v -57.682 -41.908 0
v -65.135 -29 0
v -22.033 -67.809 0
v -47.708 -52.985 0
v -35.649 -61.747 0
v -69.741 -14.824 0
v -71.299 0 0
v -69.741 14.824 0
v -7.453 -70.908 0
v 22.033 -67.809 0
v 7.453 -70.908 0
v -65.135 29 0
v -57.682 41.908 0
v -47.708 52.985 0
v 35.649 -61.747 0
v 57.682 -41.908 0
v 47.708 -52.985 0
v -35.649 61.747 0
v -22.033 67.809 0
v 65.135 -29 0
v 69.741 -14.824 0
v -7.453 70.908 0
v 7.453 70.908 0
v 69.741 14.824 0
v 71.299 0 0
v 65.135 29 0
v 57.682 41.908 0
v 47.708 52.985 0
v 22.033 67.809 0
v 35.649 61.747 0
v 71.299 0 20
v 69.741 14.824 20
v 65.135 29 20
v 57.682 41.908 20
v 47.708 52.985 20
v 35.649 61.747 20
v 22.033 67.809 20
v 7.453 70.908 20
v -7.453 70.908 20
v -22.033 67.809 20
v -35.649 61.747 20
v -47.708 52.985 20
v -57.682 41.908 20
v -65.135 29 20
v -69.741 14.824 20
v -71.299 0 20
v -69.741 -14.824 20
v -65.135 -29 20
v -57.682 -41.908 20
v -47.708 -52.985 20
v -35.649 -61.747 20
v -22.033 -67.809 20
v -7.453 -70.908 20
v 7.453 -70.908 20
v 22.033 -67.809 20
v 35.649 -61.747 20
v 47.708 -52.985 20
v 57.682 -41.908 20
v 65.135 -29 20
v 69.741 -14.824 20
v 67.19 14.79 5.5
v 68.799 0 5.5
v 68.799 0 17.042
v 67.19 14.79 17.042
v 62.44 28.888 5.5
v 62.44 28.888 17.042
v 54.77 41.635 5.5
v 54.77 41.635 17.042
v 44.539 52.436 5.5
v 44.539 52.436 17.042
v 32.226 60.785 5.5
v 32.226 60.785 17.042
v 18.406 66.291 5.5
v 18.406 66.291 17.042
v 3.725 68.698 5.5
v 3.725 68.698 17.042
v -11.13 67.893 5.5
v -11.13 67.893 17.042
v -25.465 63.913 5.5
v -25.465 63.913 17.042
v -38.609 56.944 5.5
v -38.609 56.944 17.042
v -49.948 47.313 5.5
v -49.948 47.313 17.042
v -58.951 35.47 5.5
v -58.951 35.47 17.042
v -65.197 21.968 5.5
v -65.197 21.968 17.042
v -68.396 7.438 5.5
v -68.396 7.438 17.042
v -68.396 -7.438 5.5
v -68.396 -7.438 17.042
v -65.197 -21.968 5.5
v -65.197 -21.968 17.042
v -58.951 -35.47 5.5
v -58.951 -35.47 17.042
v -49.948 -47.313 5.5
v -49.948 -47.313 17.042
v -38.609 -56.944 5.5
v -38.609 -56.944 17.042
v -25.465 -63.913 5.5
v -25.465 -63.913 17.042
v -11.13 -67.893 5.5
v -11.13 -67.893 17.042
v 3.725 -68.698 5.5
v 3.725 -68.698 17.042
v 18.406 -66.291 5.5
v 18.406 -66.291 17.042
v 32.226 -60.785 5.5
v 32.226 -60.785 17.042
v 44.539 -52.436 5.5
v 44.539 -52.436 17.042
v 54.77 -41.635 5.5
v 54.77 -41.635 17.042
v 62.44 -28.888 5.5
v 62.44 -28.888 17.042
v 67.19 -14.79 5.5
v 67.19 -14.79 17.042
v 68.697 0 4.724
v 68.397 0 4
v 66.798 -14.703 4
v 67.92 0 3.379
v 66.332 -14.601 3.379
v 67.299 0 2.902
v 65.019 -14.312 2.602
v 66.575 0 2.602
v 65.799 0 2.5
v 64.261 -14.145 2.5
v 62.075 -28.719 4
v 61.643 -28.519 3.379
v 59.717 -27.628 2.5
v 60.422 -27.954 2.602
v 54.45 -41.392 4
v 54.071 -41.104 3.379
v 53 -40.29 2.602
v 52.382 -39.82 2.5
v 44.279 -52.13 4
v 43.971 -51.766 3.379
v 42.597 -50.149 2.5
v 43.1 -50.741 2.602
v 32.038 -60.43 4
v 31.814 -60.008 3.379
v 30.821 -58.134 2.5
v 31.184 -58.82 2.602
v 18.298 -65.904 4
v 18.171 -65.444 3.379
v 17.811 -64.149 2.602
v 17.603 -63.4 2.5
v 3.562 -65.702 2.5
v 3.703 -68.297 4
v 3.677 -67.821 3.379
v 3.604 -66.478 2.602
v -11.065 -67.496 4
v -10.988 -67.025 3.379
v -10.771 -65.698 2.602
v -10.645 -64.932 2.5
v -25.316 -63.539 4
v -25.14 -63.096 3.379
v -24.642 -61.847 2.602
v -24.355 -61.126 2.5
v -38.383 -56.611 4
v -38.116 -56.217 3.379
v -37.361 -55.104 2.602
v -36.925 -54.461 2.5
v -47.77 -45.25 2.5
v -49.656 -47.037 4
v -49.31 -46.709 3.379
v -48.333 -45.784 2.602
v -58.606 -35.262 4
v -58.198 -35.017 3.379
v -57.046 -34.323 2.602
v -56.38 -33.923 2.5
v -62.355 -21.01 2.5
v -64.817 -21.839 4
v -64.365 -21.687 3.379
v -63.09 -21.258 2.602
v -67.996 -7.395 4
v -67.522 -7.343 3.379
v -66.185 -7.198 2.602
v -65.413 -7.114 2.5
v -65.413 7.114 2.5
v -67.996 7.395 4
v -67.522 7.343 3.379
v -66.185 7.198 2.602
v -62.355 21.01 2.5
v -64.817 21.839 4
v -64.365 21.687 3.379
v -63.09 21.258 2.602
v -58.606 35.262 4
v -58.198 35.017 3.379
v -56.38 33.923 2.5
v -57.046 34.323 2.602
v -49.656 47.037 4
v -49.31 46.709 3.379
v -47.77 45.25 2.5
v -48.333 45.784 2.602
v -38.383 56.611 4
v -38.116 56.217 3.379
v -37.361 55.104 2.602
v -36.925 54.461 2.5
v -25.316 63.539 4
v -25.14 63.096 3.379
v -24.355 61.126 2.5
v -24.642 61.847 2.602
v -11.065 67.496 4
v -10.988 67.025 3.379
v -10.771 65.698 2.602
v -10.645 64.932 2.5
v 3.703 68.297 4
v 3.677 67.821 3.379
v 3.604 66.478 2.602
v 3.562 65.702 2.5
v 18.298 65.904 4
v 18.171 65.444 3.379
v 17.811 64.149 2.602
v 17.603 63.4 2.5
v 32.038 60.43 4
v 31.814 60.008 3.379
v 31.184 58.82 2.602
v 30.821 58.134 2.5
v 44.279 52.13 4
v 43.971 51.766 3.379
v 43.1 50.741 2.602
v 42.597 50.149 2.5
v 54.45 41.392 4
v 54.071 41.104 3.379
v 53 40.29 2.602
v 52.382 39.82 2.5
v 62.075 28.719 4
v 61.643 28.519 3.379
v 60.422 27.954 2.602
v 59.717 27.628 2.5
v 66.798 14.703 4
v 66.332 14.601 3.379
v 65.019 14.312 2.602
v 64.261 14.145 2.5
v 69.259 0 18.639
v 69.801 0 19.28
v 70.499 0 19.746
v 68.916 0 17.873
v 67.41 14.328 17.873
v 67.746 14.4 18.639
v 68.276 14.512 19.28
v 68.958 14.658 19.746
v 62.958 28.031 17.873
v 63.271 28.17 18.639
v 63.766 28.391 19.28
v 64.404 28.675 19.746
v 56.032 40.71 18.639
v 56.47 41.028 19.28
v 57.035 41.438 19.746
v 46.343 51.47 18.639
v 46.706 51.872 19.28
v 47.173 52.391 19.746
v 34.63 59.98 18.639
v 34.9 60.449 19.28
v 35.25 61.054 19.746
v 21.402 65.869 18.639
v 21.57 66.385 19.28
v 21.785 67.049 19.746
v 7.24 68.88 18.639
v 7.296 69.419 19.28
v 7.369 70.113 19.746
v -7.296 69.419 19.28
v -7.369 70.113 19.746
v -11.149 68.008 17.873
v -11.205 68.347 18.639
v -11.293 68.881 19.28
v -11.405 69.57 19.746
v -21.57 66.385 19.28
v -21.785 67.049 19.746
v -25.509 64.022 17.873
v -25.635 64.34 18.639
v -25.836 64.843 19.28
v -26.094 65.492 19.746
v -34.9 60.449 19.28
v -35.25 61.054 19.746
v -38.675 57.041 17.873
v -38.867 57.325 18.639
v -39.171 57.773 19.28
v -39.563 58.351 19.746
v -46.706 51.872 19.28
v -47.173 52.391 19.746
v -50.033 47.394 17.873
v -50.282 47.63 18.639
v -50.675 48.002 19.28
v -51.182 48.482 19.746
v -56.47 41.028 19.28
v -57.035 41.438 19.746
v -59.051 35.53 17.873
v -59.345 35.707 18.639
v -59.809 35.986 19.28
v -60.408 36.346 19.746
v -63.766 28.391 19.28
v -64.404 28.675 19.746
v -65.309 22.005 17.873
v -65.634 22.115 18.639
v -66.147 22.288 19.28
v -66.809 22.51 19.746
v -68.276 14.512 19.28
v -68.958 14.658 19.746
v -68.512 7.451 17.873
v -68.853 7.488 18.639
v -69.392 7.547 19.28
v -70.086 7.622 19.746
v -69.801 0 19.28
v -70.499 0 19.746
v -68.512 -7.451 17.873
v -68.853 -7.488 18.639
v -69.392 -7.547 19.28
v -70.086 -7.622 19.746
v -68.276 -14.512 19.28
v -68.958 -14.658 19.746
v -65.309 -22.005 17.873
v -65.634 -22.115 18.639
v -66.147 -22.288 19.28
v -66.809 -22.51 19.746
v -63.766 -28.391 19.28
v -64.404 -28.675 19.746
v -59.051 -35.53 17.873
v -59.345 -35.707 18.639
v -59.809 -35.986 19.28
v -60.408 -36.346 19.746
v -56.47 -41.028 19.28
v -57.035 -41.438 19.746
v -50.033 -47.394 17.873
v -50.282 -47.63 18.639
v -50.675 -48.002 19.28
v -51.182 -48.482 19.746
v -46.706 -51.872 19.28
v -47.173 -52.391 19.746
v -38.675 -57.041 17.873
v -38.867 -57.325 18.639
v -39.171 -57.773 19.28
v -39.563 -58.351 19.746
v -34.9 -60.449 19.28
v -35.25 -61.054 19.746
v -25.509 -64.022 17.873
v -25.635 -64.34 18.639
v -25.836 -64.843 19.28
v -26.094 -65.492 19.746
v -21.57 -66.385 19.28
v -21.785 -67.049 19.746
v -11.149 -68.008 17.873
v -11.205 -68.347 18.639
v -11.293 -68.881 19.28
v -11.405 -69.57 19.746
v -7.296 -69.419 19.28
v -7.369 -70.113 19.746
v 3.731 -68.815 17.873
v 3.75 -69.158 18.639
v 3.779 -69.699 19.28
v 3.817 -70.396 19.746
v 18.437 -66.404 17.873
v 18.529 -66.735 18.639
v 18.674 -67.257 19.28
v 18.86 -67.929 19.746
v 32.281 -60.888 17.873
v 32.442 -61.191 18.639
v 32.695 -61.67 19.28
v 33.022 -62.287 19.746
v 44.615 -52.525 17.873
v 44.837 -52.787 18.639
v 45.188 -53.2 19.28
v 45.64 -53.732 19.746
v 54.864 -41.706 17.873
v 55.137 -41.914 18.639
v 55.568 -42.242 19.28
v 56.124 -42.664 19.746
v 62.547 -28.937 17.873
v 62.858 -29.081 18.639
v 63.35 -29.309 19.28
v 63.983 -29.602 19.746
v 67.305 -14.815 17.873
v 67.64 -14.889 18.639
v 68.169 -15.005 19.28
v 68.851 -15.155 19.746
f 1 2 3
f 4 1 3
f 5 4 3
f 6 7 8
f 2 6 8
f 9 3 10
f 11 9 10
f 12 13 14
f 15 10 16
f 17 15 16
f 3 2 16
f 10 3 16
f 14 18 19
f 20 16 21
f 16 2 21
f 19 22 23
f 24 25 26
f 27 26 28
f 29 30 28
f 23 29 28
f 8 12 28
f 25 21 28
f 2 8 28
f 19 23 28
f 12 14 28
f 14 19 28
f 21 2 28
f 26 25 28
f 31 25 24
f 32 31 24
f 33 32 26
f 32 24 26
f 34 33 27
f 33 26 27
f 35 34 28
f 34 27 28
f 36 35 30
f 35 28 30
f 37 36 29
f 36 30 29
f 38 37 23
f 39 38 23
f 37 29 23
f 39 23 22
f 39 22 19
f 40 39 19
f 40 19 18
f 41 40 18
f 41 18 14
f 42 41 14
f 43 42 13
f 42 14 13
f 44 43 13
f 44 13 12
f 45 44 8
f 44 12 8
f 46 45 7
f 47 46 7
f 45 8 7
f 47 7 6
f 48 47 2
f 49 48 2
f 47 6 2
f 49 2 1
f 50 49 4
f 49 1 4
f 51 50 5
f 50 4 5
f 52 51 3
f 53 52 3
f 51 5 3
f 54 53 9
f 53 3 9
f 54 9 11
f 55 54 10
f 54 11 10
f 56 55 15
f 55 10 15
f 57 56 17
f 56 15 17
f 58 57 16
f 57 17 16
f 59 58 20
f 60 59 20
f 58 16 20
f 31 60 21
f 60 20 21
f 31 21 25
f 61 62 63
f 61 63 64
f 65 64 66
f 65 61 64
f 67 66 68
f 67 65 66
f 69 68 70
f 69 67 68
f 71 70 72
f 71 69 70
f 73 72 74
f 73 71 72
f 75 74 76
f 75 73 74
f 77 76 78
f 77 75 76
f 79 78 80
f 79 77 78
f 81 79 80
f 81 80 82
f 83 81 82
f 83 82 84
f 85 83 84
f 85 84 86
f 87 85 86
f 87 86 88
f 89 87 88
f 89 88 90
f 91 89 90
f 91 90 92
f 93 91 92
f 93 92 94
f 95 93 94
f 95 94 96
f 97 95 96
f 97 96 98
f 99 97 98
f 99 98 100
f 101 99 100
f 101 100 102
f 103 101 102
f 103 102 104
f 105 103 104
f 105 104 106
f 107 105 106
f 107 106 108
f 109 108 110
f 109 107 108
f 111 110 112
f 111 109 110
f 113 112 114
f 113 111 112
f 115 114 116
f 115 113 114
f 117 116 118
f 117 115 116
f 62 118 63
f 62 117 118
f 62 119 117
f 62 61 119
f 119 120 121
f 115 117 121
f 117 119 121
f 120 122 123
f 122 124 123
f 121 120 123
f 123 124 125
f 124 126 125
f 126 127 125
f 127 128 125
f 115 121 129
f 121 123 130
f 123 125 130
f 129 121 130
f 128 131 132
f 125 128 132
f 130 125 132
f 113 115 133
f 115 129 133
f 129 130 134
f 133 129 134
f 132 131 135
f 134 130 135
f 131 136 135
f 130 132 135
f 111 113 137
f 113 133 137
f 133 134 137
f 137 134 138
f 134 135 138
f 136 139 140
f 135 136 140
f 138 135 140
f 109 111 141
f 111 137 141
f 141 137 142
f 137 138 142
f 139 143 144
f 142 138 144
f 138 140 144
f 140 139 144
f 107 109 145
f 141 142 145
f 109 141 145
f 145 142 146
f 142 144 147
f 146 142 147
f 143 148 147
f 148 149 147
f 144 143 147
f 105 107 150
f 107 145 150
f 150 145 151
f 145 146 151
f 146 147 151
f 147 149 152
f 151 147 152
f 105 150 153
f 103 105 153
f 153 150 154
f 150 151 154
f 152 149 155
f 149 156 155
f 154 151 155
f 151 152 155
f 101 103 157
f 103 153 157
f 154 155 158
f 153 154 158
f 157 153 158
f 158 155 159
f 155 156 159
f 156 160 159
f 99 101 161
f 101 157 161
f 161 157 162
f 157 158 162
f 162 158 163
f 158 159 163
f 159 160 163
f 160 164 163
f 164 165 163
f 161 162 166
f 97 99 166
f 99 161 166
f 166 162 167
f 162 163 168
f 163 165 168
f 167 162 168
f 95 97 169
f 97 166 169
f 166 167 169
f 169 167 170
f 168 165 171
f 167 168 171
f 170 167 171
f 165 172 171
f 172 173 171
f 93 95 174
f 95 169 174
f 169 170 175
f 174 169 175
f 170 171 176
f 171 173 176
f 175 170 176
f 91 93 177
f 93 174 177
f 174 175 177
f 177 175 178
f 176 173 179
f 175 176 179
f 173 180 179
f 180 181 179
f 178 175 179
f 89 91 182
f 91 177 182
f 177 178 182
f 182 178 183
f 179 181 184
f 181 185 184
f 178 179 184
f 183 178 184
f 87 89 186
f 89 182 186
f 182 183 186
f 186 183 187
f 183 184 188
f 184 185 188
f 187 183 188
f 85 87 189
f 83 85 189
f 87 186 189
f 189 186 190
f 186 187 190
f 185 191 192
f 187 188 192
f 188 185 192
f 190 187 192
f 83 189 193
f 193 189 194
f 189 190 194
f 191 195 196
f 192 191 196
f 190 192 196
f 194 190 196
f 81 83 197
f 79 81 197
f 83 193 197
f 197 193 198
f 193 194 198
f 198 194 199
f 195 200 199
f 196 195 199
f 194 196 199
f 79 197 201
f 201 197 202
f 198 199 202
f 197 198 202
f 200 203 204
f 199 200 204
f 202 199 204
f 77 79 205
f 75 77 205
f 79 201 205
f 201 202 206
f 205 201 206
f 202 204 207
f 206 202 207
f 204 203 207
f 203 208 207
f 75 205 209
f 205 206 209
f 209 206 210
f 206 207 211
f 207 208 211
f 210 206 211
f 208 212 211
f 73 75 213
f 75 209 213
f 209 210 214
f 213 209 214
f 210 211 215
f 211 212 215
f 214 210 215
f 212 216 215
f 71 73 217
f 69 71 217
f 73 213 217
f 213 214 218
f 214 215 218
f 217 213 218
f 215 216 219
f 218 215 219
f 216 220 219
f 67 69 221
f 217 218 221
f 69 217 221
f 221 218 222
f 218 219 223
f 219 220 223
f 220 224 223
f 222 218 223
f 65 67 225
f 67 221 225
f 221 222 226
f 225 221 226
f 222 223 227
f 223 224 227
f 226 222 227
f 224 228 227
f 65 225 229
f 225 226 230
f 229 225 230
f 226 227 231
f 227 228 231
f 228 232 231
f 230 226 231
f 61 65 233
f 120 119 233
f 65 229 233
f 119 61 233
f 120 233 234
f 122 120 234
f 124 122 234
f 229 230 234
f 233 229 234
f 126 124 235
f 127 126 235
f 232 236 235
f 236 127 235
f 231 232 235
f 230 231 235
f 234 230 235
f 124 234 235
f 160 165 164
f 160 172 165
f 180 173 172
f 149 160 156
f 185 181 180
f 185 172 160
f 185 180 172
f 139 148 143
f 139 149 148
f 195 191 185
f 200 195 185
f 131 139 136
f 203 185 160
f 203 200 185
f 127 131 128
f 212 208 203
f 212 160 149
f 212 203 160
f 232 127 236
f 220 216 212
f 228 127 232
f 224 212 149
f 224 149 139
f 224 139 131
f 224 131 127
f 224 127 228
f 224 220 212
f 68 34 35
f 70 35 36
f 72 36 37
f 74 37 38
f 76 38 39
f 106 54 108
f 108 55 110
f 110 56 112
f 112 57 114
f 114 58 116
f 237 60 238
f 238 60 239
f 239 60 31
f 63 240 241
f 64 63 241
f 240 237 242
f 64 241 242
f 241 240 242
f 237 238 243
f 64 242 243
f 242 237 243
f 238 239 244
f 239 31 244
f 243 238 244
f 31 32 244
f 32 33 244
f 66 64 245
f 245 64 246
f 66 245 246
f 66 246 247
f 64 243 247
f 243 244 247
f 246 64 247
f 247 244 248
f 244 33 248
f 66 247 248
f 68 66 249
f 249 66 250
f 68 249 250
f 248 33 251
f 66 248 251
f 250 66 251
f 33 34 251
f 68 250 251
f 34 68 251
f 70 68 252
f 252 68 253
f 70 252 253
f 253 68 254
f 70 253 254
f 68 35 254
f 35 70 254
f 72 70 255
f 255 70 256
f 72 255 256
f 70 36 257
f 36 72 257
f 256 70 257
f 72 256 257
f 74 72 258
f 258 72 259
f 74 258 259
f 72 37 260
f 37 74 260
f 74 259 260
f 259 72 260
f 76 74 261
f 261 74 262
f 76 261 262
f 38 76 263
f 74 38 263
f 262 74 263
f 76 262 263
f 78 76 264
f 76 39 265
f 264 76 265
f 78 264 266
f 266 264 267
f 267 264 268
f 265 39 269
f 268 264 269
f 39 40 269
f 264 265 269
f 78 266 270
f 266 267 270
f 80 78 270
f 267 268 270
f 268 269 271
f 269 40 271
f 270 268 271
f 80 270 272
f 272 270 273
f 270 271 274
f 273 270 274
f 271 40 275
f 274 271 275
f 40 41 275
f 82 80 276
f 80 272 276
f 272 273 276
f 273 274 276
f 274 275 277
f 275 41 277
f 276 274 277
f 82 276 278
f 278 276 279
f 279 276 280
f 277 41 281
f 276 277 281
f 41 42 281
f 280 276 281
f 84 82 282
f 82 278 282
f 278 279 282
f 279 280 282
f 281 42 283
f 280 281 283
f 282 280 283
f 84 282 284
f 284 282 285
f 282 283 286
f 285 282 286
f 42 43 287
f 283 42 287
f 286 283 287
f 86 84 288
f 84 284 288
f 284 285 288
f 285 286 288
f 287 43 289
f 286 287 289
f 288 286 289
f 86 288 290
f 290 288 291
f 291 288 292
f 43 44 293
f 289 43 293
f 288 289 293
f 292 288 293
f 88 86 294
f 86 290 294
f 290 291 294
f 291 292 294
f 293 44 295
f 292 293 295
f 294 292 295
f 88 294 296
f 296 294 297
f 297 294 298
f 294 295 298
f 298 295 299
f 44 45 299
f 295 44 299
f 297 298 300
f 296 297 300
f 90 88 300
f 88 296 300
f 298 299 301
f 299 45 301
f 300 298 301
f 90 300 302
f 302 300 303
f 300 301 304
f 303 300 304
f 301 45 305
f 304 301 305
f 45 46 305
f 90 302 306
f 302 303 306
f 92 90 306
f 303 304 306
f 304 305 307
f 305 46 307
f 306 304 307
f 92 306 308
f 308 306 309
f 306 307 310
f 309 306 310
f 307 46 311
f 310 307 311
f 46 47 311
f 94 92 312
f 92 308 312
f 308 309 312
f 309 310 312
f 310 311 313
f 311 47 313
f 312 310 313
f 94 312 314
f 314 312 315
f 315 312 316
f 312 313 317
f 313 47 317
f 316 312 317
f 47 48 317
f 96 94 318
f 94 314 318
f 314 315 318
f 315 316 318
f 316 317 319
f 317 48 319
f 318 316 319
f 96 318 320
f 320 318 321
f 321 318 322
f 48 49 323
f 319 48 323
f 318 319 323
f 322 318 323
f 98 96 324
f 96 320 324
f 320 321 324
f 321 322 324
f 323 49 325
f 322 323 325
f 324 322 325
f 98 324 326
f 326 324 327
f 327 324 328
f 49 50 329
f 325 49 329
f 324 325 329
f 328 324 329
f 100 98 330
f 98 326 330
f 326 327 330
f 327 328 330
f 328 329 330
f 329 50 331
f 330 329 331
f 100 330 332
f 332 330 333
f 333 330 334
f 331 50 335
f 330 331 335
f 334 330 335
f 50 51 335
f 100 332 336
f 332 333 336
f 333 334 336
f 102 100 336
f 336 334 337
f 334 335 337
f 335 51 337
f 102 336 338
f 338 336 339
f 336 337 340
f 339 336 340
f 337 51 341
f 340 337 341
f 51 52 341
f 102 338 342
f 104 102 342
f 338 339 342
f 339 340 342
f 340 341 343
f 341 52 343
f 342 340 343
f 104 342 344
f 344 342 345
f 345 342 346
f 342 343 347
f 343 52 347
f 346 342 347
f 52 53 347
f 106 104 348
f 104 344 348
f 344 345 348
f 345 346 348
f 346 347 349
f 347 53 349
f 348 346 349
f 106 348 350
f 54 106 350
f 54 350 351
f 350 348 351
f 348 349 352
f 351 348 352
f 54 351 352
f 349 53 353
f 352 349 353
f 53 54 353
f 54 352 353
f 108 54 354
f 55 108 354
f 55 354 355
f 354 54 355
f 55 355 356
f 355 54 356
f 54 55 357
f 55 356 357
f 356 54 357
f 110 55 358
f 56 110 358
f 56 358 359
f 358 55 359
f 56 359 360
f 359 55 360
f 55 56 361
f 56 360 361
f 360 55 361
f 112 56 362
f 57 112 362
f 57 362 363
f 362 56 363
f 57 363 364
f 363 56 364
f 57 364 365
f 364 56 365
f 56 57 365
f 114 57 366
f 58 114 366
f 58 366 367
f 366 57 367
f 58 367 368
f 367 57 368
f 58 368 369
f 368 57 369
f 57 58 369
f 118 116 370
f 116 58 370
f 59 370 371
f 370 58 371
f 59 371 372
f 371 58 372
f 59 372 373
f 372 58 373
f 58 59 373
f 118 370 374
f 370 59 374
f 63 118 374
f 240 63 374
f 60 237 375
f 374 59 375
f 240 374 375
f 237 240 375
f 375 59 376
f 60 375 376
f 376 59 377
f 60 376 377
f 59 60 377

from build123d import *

# Parameters (mm, degrees)
F0_R     = 71.2988650601
F1_DEPTH = 20
F2_T     = -2.5
F3_R     = 3


# Not quite as in the source:
# - a fillet or chamfer that OpenCascade refuses, or shapes differently, is made with other operations: its cross-section is extruded or revolved along the edge and cut away or added


with BuildPart() as f1:
    # F0 (on Top) → F1 (new body)
    with BuildSketch(Plane.XY):
        Circle(F0_R)
    extrude(amount=F1_DEPTH)

    # F2
    f2_openings = [f1.faces().sort_by_distance(p)[0] for p in [
        (0, 0, 20),
    ]]
    offset(amount=F2_T, openings=f2_openings)

    # F3
    f3_edges = [f1.edges().sort_by_distance(p)[0] for p in [
        (-68.798865, 0, 2.5),
    ]]
    fillet(f3_edges, radius=F3_R)

    # F4: fillet of radius 3 on 1 edges, made by hand

    # F4_s1 → F4_t2 (revolve, cut)
    with BuildSketch(Plane.XZ):
        with BuildLine():
            ThreePointArc((68.7988650601, 17.0419601084), (69.5075772126, 18.9784517816), (71.2988650601, 20))
            Line((71.2988650601, 20), (68.7988650601, 20))
            Line((68.7988650601, 20), (68.7988650601, 17.0419601084))
        make_face()
    revolve(axis=Axis((0, 0, 20), (0, 0, 1)), mode=Mode.SUBTRACT)


solid = f1.part
